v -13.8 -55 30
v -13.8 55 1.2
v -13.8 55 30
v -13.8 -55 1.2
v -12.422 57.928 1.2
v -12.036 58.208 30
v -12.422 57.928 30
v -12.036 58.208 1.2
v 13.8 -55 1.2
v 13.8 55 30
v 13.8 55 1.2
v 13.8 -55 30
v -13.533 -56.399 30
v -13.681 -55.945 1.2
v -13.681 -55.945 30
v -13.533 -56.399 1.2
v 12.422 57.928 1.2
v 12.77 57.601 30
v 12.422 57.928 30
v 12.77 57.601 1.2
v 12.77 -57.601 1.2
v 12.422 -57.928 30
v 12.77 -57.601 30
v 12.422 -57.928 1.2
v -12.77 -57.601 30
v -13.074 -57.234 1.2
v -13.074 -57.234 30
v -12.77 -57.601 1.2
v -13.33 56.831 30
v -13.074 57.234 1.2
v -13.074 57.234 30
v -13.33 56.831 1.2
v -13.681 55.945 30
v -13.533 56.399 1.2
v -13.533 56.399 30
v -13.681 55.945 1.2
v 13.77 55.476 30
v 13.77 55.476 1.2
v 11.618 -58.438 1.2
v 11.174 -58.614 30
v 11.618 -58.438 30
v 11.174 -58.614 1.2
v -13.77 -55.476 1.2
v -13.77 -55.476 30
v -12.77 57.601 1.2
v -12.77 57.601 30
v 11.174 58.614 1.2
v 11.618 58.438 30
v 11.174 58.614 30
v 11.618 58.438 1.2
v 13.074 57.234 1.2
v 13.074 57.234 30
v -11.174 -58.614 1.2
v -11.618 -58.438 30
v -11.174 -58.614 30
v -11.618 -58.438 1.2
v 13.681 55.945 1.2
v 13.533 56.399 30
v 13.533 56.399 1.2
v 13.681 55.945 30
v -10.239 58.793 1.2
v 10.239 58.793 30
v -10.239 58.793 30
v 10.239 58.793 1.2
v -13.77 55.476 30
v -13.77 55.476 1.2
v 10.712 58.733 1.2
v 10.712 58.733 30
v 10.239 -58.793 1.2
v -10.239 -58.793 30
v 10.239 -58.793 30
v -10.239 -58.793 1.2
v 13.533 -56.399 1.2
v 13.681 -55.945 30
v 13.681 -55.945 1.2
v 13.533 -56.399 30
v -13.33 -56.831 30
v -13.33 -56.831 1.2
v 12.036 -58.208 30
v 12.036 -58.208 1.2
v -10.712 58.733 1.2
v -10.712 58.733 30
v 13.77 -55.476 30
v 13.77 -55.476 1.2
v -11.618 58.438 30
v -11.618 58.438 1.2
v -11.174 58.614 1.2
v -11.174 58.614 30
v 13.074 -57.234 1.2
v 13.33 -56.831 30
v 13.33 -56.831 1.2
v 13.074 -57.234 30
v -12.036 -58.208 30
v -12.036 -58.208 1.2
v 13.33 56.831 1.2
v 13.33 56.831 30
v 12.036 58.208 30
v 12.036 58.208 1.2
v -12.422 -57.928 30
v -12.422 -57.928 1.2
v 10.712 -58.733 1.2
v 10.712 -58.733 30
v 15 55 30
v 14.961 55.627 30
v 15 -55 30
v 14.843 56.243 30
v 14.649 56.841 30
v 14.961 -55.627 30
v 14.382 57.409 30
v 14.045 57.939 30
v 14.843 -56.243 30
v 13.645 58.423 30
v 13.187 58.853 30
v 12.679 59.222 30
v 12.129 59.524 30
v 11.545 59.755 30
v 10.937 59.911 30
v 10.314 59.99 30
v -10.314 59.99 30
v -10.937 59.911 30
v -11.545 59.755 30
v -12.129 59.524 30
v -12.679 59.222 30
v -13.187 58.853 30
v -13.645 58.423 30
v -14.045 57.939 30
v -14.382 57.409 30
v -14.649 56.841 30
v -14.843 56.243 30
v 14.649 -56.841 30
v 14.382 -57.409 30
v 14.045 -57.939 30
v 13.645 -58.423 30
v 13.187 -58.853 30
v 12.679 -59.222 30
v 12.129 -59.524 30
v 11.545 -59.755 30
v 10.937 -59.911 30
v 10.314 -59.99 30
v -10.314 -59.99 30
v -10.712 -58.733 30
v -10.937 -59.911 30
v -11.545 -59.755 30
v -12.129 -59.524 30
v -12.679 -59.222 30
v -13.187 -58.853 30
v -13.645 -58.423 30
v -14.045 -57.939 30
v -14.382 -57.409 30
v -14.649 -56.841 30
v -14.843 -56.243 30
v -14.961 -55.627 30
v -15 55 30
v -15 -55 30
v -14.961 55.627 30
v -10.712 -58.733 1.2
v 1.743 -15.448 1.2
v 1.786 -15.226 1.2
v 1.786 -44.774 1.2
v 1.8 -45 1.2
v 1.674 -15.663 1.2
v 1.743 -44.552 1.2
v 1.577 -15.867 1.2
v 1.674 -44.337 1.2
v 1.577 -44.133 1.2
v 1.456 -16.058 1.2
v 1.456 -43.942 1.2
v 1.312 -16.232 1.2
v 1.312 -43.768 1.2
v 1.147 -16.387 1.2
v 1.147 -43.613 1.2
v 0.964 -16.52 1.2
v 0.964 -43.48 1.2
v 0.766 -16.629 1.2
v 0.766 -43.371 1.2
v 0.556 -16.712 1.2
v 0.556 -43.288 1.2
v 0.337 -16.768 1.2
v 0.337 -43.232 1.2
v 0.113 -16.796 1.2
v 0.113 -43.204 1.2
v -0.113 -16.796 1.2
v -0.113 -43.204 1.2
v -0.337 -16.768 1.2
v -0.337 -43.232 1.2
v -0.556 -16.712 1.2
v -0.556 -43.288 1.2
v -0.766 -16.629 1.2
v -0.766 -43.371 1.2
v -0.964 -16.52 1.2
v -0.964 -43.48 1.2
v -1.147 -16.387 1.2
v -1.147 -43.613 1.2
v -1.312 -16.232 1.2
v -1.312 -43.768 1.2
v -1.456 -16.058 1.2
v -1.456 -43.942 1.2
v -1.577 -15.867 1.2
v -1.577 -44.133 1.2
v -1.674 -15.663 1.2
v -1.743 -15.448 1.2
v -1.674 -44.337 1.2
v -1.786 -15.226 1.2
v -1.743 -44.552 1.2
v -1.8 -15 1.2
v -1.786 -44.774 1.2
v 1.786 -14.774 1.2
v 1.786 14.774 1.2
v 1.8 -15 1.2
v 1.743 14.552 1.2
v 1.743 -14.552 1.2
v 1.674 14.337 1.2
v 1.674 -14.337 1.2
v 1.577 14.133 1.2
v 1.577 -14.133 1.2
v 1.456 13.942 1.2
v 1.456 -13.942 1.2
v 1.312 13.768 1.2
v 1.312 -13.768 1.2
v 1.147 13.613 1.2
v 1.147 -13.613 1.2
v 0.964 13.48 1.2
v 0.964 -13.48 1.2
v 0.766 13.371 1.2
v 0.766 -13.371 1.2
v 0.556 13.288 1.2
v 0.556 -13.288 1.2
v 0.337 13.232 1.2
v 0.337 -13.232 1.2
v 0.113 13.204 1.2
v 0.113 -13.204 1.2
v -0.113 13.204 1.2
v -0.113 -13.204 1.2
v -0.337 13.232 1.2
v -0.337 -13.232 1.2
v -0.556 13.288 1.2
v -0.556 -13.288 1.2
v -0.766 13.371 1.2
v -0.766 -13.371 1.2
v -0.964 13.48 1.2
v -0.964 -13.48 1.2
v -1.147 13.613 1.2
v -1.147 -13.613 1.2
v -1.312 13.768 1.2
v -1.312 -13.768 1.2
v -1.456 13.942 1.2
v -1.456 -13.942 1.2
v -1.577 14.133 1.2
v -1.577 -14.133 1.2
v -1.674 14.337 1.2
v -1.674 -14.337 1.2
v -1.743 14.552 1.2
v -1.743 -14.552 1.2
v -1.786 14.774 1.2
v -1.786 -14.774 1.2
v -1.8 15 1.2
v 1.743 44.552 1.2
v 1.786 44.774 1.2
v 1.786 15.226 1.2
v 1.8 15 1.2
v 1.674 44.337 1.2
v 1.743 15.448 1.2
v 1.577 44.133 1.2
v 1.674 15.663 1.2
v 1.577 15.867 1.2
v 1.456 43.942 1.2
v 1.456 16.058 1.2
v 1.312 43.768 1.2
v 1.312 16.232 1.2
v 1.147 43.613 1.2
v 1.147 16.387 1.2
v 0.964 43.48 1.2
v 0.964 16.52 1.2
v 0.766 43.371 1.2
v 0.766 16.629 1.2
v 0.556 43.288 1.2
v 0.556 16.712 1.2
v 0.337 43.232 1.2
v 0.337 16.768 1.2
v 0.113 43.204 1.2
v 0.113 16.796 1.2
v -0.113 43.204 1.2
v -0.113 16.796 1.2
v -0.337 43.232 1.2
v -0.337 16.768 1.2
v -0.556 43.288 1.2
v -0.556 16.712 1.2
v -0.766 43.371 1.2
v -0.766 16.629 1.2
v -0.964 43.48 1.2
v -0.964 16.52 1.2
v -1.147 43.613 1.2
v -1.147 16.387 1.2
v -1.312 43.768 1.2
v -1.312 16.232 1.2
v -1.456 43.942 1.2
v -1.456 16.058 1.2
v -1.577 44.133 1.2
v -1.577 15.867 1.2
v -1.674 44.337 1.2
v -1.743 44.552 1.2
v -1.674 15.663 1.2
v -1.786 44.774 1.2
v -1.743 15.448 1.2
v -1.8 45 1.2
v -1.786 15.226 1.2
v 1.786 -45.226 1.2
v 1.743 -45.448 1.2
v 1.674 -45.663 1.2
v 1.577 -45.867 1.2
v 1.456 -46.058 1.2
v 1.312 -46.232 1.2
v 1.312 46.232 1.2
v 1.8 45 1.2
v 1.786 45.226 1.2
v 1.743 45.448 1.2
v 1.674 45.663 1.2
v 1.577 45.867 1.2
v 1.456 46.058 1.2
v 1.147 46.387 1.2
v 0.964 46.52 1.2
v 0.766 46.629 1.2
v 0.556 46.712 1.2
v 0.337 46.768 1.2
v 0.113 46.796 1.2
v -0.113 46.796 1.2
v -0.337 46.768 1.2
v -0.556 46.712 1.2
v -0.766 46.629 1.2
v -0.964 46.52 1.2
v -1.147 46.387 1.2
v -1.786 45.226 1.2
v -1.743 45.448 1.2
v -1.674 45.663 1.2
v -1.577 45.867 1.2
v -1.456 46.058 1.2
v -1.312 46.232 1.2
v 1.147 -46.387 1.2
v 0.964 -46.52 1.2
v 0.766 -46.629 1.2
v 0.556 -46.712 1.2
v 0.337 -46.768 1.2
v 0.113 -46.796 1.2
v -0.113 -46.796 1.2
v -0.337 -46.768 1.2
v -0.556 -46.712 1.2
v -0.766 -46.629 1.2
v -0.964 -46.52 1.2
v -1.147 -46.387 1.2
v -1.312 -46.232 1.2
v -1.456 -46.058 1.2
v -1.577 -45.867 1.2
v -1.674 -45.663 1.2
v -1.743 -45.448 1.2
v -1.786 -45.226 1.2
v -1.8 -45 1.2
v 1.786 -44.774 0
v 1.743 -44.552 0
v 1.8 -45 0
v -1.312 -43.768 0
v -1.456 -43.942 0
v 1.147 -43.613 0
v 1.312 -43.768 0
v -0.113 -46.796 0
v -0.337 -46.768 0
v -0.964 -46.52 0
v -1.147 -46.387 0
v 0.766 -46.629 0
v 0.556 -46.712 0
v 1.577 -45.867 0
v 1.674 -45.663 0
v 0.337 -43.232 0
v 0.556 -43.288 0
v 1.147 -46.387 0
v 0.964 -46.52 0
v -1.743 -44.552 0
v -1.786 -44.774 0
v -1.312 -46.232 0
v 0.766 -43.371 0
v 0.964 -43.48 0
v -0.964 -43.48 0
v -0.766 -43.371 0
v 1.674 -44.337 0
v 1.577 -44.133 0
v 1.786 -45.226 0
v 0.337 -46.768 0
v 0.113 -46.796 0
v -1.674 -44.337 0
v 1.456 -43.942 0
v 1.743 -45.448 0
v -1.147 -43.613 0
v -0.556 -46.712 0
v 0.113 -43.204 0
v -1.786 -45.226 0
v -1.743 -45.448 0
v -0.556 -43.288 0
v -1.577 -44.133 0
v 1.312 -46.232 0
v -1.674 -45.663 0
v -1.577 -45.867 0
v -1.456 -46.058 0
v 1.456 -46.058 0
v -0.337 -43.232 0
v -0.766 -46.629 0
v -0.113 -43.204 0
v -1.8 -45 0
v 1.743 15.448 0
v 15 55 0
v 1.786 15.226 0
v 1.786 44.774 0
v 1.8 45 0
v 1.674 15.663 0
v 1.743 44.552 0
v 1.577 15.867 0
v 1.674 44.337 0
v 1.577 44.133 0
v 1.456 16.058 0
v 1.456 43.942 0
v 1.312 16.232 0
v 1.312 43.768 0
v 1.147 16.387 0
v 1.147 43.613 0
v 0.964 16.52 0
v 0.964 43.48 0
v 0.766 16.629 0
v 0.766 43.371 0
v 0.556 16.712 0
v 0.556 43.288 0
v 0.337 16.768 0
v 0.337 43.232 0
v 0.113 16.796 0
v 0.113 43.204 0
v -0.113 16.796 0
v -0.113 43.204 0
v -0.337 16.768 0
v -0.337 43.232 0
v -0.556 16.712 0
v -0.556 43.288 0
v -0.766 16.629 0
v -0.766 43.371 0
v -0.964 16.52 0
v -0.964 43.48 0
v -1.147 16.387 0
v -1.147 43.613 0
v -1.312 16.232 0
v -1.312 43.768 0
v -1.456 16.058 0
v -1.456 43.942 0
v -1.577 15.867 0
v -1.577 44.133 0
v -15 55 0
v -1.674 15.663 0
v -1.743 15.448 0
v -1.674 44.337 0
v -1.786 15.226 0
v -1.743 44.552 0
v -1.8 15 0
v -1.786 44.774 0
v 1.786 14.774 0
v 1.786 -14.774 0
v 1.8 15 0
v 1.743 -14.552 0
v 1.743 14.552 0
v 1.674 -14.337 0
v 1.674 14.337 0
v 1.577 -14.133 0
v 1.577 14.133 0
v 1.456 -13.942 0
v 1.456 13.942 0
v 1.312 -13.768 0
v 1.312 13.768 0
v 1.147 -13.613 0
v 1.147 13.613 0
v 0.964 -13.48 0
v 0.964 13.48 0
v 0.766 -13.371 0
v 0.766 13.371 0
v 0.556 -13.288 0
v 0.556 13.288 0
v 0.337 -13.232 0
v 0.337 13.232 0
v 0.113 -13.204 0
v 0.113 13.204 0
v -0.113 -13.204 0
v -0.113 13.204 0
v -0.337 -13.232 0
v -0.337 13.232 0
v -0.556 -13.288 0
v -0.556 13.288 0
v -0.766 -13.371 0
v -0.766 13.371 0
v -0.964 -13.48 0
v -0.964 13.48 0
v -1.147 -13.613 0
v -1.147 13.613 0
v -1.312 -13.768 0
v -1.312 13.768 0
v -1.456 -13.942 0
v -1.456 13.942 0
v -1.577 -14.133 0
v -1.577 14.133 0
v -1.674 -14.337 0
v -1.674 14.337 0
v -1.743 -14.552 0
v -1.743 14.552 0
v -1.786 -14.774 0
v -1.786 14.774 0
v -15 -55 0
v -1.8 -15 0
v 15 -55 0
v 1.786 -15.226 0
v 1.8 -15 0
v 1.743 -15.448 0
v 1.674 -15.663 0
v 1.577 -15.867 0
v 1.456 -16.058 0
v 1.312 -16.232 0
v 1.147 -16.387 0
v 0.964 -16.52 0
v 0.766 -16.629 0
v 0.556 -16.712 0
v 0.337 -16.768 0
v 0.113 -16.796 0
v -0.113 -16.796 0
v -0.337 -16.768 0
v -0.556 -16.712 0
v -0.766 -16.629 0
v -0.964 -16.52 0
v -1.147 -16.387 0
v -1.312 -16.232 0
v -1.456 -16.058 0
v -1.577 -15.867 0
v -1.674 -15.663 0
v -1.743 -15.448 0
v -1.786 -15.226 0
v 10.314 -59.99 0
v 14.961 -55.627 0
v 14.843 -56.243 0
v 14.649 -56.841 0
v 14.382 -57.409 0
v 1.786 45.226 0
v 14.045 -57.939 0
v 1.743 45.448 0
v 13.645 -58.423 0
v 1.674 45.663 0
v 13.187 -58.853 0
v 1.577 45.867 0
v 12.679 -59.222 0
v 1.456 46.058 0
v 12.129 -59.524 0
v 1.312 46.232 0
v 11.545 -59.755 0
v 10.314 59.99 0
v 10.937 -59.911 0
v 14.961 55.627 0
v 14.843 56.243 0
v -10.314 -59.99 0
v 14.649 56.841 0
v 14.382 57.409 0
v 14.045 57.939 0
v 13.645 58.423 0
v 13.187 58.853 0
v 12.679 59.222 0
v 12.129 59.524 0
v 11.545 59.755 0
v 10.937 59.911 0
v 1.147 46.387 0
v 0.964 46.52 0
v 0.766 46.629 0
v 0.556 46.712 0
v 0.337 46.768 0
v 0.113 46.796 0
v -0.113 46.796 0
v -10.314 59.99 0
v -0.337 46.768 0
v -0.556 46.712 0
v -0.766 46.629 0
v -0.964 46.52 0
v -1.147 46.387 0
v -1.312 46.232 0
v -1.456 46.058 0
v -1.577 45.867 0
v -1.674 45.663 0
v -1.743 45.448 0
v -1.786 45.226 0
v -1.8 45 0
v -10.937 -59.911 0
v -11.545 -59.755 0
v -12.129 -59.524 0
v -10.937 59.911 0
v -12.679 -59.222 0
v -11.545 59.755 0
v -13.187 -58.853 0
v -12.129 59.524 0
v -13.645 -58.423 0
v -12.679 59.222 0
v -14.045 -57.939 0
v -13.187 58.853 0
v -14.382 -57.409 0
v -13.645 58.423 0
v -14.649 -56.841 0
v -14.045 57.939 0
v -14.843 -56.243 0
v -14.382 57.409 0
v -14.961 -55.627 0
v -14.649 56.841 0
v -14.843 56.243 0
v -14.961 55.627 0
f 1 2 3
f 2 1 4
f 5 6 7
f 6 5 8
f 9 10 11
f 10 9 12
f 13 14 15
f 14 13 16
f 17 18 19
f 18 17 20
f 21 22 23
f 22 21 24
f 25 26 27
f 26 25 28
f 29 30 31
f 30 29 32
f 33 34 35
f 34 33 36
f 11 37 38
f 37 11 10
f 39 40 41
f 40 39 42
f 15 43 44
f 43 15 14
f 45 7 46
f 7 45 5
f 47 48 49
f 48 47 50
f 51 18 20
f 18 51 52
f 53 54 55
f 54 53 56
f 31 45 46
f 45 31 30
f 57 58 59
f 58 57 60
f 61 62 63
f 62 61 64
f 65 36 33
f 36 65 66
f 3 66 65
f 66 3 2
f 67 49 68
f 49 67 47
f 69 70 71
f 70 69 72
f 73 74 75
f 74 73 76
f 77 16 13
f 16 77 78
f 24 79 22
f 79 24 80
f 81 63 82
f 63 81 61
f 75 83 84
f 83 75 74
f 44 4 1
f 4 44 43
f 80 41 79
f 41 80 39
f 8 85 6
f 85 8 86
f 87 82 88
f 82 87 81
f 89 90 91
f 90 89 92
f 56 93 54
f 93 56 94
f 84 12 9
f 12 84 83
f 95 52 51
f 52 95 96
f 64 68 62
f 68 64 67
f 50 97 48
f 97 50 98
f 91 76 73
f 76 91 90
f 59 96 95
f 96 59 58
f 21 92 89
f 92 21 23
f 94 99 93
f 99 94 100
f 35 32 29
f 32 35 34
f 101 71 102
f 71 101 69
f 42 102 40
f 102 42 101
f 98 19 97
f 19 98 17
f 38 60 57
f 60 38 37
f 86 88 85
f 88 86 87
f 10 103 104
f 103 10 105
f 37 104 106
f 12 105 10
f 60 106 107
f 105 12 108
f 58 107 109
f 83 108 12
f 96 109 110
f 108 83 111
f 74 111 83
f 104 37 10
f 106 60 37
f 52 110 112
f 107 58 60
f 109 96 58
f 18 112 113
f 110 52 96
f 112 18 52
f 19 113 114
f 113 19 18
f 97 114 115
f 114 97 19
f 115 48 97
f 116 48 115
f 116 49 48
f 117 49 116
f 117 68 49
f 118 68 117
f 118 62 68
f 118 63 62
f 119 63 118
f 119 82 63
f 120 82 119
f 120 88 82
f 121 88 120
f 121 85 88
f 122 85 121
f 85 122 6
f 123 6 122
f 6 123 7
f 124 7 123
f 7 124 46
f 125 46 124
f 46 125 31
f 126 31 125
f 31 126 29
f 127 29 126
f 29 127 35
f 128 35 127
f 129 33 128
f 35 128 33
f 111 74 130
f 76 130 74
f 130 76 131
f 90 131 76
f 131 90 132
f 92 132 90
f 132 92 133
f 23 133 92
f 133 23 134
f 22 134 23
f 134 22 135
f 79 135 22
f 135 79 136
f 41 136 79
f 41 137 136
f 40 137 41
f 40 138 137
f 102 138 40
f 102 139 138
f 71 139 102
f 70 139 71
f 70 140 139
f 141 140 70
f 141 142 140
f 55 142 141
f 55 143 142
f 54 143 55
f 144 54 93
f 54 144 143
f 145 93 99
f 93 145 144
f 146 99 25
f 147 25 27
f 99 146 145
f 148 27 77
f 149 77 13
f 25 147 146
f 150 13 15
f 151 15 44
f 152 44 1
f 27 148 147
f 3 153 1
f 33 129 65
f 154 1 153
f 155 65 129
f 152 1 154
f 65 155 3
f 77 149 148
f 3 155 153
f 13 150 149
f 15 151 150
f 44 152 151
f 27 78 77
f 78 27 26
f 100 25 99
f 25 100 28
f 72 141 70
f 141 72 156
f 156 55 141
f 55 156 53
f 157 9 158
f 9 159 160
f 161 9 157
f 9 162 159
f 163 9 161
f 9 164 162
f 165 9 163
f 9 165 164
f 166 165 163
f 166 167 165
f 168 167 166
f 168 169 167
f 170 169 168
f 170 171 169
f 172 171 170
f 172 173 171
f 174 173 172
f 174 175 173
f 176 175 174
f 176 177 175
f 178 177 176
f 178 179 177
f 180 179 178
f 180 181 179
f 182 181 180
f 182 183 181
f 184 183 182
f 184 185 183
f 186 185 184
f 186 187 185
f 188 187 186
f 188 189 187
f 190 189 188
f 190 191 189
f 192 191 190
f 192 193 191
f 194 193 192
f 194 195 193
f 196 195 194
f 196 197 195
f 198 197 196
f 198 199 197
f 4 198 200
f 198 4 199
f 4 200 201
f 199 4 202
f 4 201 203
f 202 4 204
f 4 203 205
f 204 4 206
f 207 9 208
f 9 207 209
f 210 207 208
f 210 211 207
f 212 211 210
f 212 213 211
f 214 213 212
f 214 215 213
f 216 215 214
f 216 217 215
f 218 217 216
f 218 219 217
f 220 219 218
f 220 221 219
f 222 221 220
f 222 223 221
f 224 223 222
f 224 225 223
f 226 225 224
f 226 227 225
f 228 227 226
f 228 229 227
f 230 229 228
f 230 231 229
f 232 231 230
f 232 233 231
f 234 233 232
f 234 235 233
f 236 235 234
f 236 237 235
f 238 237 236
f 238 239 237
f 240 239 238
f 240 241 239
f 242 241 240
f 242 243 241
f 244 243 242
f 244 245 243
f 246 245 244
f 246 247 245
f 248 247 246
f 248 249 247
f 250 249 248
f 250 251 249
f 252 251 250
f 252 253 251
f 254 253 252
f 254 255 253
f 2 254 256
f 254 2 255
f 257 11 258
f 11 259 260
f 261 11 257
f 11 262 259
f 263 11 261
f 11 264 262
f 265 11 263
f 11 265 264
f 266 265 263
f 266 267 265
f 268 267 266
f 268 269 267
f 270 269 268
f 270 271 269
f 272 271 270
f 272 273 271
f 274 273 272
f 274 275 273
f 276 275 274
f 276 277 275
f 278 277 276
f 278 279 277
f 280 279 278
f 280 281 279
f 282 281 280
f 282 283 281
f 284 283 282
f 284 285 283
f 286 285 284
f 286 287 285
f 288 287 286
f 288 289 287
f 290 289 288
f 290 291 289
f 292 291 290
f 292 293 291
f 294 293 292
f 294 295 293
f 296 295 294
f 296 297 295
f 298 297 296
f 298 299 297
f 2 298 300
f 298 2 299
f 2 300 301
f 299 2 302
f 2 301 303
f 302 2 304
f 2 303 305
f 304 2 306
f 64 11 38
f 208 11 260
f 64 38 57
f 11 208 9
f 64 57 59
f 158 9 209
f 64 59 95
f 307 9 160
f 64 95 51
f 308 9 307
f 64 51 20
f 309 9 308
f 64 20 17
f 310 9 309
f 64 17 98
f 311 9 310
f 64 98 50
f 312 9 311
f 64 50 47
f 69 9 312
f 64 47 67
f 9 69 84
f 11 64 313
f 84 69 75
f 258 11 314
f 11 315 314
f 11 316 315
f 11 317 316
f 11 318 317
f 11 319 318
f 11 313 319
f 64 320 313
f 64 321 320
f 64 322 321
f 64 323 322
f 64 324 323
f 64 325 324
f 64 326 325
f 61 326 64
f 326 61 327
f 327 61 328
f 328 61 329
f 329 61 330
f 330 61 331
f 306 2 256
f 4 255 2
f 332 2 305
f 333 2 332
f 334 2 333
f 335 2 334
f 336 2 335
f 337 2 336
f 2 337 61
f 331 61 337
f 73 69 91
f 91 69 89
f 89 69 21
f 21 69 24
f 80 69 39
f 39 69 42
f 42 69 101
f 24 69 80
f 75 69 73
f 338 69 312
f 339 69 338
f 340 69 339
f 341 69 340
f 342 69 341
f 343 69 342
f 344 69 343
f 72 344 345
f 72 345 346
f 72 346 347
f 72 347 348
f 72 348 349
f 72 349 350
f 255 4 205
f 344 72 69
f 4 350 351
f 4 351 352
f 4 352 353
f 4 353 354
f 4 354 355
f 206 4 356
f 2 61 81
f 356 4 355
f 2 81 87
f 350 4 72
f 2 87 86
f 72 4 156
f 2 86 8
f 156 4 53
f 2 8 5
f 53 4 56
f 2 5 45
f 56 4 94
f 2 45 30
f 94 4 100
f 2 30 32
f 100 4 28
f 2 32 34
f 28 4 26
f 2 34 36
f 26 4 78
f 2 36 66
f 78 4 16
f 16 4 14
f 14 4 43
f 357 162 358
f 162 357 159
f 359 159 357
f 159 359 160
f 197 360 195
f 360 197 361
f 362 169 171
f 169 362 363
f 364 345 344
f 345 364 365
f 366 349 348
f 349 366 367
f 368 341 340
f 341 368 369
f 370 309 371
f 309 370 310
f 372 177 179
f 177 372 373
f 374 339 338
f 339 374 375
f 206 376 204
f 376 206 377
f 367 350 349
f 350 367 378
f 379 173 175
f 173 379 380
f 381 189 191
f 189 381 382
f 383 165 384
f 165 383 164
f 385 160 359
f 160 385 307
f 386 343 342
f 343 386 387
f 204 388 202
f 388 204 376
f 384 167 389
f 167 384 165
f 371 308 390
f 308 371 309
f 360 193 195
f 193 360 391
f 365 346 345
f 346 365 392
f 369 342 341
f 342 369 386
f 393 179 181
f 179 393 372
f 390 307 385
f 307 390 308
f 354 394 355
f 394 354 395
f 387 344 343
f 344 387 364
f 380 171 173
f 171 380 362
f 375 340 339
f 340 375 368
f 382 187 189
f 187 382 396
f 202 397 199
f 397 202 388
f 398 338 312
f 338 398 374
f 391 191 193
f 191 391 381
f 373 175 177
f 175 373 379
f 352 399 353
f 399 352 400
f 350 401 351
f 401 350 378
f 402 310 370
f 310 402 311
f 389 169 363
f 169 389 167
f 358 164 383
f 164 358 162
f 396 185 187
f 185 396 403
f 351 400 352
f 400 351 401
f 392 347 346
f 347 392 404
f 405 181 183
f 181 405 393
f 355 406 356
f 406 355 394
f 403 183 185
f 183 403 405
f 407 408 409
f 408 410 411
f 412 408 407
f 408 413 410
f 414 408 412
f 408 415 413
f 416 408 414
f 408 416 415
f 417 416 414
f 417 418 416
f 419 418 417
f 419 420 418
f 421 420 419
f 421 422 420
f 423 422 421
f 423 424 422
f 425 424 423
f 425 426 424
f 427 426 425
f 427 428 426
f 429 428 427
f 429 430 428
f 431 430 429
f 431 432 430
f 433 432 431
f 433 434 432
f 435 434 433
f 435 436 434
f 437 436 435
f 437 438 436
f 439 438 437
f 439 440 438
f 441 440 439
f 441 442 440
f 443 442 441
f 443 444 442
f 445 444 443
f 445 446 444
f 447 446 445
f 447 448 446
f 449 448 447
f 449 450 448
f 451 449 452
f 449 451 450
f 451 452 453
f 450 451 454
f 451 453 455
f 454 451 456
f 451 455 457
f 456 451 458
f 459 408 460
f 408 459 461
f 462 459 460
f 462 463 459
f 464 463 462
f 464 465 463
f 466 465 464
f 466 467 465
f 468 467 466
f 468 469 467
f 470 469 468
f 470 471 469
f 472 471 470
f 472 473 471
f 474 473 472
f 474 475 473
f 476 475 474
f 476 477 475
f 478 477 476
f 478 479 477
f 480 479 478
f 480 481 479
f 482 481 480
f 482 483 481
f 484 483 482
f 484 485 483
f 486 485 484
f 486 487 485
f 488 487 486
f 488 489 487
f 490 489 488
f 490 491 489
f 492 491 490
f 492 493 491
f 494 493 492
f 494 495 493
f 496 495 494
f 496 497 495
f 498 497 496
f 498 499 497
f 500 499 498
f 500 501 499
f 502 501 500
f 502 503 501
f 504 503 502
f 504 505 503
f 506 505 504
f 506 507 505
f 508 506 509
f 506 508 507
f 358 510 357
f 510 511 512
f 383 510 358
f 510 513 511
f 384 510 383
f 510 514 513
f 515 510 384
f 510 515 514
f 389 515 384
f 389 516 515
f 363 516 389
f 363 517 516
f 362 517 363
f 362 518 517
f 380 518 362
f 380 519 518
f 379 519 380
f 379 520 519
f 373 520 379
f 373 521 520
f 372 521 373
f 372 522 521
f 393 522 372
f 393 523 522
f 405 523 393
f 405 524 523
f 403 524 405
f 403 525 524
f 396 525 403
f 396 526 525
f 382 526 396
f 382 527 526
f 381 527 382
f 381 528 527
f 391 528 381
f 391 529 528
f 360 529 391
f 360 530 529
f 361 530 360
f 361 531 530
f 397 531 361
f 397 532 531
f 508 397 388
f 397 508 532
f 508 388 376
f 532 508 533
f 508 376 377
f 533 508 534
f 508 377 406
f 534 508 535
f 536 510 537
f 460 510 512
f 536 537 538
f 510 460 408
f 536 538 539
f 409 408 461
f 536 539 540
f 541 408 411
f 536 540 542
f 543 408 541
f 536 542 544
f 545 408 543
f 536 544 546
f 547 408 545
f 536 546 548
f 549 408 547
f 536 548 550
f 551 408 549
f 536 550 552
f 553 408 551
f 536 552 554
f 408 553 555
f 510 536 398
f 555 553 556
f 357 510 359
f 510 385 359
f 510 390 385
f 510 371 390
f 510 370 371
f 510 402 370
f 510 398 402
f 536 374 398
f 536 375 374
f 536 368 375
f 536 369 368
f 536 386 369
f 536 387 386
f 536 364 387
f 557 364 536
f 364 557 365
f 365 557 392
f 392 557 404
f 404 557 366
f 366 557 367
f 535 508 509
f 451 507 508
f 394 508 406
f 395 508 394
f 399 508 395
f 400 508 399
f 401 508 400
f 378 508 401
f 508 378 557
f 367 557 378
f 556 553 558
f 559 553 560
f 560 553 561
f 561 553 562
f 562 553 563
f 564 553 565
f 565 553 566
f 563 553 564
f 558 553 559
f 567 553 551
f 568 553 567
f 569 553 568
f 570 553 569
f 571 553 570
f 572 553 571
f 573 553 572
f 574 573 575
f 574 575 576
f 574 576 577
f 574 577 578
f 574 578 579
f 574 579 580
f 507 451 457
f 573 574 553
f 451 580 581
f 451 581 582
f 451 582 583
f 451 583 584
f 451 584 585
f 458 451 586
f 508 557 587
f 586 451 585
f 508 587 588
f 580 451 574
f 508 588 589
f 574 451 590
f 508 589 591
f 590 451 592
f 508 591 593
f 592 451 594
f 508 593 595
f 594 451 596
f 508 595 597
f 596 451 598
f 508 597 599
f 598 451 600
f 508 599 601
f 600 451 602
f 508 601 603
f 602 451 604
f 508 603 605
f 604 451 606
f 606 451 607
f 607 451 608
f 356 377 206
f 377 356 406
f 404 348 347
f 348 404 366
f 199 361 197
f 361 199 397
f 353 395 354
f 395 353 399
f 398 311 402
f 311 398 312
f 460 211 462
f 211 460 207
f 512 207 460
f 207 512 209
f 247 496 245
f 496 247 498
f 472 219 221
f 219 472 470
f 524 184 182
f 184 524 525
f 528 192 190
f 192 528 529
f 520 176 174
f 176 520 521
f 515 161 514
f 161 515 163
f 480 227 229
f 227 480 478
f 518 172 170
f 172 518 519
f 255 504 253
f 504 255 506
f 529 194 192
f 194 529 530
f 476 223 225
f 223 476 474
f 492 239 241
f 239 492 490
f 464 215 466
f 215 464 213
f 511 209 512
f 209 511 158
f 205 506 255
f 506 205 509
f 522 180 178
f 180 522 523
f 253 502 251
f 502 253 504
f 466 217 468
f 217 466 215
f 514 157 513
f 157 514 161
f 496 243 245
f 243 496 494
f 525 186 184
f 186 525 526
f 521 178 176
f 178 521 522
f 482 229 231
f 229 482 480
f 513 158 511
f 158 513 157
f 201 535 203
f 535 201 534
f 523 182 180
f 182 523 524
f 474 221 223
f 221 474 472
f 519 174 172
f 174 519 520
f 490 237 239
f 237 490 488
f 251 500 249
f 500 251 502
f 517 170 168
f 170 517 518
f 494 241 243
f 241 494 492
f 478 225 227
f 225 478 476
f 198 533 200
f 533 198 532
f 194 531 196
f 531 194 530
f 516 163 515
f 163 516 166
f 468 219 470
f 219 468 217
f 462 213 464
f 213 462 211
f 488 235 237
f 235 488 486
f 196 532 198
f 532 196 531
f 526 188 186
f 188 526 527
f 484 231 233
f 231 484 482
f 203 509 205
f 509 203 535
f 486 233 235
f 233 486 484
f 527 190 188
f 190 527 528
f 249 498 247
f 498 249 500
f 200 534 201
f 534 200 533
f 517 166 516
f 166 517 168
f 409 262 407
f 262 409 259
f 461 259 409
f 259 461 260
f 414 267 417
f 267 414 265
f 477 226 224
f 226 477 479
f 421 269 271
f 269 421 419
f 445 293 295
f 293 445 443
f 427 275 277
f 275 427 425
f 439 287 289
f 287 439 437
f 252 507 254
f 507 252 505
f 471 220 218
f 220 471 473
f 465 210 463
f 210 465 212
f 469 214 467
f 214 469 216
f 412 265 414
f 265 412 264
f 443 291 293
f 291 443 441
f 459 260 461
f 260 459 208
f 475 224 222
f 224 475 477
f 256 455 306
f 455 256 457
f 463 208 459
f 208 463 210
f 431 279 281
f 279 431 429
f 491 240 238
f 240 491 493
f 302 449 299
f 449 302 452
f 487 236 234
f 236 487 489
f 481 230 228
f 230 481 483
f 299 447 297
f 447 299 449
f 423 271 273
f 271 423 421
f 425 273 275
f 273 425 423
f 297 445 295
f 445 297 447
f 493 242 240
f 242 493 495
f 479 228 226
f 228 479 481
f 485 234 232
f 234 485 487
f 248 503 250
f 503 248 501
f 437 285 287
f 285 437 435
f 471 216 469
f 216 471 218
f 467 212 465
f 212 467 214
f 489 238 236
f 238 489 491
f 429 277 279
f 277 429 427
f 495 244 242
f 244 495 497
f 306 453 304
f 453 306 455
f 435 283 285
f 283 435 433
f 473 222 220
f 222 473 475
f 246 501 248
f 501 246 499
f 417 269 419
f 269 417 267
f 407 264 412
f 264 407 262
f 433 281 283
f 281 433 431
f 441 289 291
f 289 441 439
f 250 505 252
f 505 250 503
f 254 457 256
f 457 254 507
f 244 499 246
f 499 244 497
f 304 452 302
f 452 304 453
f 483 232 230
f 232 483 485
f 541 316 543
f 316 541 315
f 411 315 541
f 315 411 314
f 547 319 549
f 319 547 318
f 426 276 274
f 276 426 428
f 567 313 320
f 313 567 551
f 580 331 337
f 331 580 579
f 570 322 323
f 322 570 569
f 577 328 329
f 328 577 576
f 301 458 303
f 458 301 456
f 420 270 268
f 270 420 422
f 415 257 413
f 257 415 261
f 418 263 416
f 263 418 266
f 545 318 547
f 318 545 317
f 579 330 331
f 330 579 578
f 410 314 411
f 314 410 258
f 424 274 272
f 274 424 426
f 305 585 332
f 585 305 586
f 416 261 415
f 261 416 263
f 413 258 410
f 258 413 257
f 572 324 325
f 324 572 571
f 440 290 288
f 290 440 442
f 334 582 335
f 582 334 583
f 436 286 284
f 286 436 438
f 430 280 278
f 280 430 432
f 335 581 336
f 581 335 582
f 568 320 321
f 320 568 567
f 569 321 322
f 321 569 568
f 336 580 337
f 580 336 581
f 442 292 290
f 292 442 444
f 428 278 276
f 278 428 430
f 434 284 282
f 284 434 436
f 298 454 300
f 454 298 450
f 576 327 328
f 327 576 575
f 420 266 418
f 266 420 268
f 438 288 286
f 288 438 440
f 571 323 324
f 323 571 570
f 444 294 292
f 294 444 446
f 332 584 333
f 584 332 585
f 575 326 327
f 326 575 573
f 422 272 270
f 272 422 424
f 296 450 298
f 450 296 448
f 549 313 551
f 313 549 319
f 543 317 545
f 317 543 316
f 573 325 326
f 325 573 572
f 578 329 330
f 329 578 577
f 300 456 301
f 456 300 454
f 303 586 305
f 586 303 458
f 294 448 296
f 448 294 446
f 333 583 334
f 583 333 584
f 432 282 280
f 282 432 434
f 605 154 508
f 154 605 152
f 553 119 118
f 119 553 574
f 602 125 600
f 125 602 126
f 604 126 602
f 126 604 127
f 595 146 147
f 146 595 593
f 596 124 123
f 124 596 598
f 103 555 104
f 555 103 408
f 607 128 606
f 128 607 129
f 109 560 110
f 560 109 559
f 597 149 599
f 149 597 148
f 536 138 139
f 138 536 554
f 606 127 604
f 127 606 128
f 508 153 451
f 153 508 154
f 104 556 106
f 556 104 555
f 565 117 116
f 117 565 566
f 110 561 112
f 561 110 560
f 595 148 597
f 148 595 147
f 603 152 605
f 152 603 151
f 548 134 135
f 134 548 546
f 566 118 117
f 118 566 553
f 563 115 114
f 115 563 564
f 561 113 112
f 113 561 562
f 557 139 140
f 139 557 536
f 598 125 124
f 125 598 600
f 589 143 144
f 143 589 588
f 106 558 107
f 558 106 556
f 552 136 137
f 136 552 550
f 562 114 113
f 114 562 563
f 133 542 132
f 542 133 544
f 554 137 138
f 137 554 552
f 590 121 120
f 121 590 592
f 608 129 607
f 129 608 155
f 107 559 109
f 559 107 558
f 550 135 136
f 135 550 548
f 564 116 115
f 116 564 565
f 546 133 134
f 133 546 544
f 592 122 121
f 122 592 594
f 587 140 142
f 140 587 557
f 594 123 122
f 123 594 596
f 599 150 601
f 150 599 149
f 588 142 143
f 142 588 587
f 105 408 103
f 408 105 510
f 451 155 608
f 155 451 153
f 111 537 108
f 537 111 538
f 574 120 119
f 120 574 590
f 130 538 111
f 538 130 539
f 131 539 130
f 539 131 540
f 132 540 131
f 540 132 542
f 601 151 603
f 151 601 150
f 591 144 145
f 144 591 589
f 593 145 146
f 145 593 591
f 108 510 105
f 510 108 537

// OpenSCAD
$fn = 50;


difference() {
	union() {
		hull() {
			translate(v = [-10.0000000000, 55.0000000000, 0]) {
				cylinder(h = 30, r = 5);
			}
			translate(v = [10.0000000000, 55.0000000000, 0]) {
				cylinder(h = 30, r = 5);
			}
			translate(v = [-10.0000000000, -55.0000000000, 0]) {
				cylinder(h = 30, r = 5);
			}
			translate(v = [10.0000000000, -55.0000000000, 0]) {
				cylinder(h = 30, r = 5);
			}
		}
	}
	union() {
		translate(v = [0, 0, 1.2000000000]) {
			hull() {
				translate(v = [-10.0000000000, 55.0000000000, 0]) {
					cylinder(h = 28.8000000000, r = 3.8000000000);
				}
				translate(v = [10.0000000000, 55.0000000000, 0]) {
					cylinder(h = 28.8000000000, r = 3.8000000000);
				}
				translate(v = [-10.0000000000, -55.0000000000, 0]) {
					cylinder(h = 28.8000000000, r = 3.8000000000);
				}
				translate(v = [10.0000000000, -55.0000000000, 0]) {
					cylinder(h = 28.8000000000, r = 3.8000000000);
				}
			}
		}
		#translate(v = [0.0000000000, -45.0000000000, 0]) {
			cylinder(h = 1.2000000000, r = 1.8000000000);
		}
		#translate(v = [0.0000000000, -15.0000000000, 0]) {
			cylinder(h = 1.2000000000, r = 1.8000000000);
		}
		#translate(v = [0.0000000000, 15.0000000000, 0]) {
			cylinder(h = 1.2000000000, r = 1.8000000000);
		}
		#translate(v = [0.0000000000, 45.0000000000, 0]) {
			cylinder(h = 1.2000000000, r = 1.8000000000);
		}
	}
}
